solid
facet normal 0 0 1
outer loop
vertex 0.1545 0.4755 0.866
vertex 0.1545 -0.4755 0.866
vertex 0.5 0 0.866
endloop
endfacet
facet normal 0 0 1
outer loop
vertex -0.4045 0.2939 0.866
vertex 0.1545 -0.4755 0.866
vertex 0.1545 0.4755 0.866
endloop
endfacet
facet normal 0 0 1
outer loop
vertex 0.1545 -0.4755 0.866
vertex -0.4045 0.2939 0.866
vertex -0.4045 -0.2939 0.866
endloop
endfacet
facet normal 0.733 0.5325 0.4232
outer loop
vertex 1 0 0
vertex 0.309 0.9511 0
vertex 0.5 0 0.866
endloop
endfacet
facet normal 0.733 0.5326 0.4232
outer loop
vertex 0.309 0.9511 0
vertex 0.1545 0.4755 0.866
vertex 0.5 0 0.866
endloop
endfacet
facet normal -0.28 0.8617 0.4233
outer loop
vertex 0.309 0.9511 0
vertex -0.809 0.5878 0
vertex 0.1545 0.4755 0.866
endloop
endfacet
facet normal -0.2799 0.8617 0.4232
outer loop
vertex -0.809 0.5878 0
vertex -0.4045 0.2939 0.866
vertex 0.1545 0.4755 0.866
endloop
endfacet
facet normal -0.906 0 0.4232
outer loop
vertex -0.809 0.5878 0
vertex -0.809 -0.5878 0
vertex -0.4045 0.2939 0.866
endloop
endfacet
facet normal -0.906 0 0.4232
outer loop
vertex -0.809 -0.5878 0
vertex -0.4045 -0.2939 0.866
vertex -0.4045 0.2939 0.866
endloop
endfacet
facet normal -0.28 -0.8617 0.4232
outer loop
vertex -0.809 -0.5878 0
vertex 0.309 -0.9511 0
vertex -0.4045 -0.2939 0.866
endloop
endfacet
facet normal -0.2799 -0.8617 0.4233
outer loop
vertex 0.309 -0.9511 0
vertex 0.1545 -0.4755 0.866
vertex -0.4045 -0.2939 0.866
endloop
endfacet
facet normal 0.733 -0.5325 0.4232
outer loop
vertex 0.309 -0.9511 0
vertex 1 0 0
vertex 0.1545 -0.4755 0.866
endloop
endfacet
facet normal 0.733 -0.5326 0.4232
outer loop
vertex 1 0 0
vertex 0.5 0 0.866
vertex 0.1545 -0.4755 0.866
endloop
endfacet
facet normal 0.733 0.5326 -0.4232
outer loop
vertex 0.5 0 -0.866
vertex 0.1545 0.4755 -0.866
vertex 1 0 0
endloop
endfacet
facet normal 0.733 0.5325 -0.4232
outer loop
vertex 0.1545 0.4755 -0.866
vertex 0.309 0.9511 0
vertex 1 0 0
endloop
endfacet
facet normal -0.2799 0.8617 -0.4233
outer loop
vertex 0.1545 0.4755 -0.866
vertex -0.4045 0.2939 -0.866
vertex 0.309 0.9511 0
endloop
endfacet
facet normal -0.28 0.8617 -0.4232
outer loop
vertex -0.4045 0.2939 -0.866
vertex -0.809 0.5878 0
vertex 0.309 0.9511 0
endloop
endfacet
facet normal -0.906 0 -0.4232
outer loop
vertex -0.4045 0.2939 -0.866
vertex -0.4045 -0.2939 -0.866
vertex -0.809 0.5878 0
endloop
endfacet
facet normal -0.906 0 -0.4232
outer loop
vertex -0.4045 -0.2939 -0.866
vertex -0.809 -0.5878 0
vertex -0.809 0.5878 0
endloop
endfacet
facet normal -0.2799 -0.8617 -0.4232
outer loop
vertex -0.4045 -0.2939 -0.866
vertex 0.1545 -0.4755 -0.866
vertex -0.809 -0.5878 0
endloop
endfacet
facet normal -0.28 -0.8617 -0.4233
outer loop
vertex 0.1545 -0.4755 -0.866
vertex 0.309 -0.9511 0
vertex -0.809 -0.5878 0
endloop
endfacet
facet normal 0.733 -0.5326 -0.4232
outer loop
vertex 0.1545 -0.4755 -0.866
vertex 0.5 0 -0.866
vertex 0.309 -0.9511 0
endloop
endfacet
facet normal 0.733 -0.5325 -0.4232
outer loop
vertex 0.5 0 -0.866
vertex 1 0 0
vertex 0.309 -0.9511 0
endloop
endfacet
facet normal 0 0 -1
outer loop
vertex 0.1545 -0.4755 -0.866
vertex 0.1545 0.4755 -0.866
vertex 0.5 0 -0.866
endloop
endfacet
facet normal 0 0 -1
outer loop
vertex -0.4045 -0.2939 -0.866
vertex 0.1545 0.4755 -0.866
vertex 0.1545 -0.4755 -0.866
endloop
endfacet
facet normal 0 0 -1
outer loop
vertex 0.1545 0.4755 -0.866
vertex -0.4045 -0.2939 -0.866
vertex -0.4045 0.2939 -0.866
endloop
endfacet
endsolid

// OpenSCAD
// ======== include <b.scad> ========
module part() sphere(1);

// ======== main.scad ========
part();
